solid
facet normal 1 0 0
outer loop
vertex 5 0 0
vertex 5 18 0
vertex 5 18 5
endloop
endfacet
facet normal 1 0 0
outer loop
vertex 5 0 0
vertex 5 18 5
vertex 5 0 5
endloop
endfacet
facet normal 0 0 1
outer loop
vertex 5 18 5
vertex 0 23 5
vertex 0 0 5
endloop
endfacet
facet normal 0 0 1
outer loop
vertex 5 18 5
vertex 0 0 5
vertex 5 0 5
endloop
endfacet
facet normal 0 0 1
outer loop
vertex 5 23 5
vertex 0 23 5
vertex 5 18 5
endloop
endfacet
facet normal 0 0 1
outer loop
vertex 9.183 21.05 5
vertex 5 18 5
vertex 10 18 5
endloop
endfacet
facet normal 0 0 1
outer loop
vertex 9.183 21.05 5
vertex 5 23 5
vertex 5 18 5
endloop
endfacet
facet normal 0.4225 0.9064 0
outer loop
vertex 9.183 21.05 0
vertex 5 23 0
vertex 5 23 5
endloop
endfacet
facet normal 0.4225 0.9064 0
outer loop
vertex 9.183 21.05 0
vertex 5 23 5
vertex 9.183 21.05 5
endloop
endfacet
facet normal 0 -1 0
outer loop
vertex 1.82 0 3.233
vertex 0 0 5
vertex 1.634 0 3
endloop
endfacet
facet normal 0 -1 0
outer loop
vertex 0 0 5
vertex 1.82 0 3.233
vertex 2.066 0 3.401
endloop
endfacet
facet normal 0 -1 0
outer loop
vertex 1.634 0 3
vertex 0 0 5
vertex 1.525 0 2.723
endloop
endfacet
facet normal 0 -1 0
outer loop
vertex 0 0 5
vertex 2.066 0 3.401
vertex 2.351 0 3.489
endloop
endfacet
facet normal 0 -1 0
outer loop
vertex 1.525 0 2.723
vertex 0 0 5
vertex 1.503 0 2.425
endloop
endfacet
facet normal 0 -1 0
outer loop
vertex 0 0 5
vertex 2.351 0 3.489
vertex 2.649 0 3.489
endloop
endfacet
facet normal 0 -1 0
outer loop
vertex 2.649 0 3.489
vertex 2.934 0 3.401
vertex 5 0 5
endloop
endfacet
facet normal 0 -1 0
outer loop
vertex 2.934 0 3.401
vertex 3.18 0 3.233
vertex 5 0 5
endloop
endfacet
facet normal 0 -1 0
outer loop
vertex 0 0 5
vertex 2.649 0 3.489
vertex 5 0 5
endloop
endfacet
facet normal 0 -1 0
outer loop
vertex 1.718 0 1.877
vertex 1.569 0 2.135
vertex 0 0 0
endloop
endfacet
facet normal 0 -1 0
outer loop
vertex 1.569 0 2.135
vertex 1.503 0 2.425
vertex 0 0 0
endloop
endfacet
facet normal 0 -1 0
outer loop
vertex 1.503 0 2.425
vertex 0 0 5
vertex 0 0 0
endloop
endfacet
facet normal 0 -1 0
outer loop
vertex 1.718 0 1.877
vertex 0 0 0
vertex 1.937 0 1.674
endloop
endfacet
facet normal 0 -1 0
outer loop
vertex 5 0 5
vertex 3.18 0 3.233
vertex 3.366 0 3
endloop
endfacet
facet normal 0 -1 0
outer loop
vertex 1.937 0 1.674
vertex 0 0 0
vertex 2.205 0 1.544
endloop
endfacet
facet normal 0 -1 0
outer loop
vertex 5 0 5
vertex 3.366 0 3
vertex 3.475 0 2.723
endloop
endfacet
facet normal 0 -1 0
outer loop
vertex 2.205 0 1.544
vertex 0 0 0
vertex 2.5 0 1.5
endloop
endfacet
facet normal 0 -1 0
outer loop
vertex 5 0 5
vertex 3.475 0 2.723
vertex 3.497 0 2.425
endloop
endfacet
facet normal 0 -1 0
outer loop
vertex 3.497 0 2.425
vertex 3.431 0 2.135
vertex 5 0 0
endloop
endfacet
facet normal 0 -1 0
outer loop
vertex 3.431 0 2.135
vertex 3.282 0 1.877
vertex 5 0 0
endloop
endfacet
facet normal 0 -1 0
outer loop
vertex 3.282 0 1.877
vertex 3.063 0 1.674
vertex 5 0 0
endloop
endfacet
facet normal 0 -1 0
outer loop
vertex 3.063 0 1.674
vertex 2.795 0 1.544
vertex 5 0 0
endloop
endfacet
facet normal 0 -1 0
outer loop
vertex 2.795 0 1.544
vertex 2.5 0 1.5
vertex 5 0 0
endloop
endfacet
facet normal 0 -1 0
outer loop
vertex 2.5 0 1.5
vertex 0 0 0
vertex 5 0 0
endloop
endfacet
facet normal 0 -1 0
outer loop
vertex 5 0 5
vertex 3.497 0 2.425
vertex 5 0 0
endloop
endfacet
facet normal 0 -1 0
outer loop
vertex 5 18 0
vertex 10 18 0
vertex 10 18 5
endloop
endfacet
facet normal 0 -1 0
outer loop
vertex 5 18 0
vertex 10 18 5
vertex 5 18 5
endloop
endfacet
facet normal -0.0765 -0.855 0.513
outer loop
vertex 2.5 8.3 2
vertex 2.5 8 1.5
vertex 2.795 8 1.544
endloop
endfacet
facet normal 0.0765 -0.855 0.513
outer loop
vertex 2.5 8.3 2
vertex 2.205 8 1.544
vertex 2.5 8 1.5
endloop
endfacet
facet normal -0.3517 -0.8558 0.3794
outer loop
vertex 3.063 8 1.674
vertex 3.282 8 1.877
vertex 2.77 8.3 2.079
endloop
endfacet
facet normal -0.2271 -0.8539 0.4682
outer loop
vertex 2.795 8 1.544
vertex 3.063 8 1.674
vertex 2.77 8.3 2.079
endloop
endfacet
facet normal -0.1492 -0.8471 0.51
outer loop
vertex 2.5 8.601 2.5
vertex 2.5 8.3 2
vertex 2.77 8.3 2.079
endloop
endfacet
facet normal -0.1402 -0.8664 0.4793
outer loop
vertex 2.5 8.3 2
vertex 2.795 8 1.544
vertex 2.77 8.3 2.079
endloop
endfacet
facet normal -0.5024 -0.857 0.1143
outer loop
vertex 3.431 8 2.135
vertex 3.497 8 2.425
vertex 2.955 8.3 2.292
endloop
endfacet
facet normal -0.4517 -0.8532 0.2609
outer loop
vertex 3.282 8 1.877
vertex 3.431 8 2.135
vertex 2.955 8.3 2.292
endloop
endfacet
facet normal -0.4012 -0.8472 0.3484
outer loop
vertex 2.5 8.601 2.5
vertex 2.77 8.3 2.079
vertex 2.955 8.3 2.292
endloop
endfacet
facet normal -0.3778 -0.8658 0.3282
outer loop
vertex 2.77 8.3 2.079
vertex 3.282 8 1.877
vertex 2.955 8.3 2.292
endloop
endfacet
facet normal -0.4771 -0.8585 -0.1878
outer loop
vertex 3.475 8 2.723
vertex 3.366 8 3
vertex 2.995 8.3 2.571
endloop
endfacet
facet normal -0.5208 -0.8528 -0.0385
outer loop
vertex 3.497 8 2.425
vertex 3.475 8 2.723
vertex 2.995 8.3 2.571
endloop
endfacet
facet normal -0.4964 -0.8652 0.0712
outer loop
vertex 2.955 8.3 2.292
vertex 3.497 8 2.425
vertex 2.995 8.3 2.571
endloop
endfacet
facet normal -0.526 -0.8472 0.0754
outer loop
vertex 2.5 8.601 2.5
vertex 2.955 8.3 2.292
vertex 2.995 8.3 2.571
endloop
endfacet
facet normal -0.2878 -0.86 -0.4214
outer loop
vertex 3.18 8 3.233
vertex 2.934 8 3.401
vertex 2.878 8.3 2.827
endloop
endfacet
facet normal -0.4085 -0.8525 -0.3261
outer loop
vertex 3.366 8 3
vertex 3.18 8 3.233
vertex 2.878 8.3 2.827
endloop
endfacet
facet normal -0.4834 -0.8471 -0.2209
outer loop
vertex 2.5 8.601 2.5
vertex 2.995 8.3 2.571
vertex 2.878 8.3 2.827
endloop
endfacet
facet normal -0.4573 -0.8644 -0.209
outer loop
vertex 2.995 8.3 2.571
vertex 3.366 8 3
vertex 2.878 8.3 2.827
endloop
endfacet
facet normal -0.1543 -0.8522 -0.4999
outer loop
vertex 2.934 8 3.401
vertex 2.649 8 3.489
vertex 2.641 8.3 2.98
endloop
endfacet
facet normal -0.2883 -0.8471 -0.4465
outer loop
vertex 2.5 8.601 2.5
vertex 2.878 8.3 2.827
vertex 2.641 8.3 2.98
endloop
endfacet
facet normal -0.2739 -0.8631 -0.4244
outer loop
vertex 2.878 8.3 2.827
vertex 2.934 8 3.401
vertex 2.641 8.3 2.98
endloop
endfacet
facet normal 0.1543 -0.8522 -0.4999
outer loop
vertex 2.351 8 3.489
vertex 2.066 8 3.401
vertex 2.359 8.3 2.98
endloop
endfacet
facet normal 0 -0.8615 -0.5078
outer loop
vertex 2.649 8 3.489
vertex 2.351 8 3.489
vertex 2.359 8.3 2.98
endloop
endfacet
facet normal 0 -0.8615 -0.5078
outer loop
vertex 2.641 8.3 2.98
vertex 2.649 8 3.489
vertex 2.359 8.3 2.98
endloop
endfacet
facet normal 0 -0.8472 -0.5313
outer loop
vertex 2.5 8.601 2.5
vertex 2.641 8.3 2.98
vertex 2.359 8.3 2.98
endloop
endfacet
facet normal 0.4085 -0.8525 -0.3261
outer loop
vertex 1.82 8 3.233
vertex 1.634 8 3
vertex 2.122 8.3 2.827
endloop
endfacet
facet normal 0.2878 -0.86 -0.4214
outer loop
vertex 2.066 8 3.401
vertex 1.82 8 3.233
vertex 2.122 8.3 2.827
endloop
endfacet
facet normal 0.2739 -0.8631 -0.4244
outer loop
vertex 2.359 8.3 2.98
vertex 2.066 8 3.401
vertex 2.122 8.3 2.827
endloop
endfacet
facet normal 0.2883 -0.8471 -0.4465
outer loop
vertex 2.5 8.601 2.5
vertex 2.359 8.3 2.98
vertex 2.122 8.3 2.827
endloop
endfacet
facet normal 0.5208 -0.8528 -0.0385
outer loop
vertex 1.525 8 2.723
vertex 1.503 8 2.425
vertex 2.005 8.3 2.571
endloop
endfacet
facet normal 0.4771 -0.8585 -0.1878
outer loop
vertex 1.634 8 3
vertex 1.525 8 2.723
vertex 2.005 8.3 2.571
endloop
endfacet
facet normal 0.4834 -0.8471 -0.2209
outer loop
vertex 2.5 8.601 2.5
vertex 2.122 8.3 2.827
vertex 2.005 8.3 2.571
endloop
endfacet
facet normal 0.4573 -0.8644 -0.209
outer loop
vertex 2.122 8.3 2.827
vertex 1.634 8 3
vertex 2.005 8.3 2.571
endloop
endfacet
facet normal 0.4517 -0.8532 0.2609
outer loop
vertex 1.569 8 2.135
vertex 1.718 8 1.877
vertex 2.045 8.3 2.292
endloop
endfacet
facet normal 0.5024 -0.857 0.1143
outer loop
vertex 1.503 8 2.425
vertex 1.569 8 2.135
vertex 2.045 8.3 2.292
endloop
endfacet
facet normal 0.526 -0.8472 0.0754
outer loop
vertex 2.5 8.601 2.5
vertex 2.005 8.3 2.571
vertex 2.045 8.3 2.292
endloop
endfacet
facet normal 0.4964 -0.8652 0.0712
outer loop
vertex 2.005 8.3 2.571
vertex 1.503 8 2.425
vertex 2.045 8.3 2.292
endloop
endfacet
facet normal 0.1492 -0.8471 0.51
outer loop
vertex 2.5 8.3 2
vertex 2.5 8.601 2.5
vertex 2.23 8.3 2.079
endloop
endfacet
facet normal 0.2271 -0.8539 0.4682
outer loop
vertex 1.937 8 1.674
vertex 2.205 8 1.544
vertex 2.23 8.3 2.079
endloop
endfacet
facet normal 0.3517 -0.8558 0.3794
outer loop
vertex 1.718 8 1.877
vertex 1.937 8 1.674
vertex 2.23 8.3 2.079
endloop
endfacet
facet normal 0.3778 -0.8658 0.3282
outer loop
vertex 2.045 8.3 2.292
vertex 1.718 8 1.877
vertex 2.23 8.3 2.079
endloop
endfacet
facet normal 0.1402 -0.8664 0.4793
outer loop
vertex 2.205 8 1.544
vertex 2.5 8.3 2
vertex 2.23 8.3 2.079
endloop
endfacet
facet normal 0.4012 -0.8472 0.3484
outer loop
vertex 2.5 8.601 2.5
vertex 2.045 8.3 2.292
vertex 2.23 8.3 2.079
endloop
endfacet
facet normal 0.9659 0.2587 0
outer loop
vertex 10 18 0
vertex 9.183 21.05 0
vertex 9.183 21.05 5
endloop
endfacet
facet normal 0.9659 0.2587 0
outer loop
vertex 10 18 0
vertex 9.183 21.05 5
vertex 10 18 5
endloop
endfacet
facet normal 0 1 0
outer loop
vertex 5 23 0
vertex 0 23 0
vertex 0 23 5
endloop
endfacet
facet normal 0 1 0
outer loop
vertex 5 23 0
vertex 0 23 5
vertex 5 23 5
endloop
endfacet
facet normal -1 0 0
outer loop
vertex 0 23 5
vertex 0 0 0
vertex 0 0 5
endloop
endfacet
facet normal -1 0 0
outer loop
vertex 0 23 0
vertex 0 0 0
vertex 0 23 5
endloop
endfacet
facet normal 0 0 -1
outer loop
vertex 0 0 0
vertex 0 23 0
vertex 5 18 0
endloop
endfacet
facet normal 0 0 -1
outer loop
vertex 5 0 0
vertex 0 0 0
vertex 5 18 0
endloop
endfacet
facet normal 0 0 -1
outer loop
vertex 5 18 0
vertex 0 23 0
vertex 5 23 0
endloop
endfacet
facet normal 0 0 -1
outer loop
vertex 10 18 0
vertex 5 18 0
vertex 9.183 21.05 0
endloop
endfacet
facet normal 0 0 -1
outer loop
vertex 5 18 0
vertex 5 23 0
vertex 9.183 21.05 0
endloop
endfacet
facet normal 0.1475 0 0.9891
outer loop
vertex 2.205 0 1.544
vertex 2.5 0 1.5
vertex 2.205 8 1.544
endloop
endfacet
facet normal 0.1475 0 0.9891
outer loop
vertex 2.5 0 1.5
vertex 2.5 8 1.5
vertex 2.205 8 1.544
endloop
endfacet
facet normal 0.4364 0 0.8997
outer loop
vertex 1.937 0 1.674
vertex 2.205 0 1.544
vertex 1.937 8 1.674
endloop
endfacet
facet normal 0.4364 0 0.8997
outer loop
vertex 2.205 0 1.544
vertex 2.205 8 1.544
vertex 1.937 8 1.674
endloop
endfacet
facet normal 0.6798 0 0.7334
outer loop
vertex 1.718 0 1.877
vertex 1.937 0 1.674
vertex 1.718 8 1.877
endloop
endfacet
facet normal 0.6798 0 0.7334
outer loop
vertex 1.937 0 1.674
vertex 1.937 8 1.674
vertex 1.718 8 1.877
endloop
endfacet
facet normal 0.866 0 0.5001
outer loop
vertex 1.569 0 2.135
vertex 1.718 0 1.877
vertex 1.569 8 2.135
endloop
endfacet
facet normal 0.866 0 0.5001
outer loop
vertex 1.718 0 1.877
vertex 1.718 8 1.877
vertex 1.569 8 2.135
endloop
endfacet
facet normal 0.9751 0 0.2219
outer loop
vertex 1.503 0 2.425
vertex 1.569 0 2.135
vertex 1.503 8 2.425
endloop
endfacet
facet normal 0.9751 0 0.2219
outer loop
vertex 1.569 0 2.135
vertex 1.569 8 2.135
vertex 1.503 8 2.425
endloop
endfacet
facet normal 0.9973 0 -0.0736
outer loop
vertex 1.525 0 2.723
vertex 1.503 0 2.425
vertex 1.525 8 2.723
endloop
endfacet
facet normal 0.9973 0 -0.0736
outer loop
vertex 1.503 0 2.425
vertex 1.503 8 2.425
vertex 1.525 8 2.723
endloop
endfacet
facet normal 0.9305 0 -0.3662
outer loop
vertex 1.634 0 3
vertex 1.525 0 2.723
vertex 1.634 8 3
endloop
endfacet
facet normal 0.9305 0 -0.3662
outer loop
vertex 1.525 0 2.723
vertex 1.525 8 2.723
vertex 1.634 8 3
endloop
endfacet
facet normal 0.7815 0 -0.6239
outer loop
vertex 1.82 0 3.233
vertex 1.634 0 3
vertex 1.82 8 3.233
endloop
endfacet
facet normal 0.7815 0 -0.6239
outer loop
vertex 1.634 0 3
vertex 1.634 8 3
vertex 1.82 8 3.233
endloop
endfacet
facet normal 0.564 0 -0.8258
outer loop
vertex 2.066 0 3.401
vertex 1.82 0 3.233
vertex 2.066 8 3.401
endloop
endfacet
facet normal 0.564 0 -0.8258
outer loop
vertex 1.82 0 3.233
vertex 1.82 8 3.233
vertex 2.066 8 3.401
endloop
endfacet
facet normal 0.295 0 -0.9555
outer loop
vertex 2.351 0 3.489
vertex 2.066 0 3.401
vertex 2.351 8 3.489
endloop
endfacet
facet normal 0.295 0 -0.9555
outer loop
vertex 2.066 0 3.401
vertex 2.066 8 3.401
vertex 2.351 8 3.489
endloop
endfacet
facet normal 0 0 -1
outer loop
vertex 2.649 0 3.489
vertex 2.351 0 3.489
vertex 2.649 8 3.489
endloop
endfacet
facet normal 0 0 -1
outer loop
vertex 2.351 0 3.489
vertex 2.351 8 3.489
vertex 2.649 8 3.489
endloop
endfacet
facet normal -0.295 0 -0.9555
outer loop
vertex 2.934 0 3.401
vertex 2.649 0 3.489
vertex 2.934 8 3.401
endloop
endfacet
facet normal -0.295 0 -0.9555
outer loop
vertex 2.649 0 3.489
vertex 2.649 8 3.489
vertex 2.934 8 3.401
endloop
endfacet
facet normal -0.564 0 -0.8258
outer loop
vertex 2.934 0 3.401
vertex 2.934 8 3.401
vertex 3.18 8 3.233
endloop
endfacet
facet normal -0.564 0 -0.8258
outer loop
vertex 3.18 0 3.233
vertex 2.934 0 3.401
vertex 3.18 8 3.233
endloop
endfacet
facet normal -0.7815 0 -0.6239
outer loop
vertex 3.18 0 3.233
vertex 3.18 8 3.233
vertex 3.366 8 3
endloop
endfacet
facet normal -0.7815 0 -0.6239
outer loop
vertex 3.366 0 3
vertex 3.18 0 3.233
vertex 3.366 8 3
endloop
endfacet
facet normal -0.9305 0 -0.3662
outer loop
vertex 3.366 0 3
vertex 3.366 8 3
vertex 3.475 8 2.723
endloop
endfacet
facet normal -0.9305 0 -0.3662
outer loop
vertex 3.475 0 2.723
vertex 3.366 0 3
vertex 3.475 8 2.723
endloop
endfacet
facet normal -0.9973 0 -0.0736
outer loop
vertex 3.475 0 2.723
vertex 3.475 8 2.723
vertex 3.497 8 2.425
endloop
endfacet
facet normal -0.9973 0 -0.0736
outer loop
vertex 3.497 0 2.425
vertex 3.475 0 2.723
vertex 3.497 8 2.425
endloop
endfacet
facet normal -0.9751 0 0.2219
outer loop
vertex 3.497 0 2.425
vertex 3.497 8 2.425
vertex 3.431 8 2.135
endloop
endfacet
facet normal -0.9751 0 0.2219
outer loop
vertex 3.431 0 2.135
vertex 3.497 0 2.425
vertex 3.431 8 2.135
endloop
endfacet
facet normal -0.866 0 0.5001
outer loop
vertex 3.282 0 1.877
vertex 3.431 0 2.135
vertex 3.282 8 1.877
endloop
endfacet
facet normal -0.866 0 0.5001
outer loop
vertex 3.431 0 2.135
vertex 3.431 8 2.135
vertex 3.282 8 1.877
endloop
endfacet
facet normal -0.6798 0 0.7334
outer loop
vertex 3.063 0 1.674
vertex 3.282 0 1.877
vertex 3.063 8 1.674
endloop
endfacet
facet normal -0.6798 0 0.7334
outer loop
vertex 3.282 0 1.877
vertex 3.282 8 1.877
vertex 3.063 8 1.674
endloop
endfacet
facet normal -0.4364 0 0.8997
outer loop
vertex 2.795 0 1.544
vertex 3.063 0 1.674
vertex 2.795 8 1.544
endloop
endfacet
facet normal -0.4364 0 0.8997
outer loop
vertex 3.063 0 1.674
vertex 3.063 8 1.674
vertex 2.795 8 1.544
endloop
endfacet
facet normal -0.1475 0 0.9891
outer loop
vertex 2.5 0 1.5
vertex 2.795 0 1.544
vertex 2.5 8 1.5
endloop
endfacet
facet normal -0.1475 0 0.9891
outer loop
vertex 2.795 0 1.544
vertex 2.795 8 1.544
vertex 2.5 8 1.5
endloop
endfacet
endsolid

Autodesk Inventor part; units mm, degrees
ref_plane "YZ Plane" through (0, 0, 0) normal (1, 0, 0) x (0, 1, 0)
ref_plane "XZ Plane" through (0, 0, 0) normal (0, 1, 0) x (-1, 0, 0)
ref_plane "XY Plane" through (0, 0, 0) normal (0, 0, 1) x (1, 0, 0)
sketch "Esquisse1" plane through (0, 0, 0) normal (0, 0, 1) x (1, 0, 0)
  line L0 (0, 0) -> (0, 23)
  line L1 (-2, 0) -> (12, 0) projected
  line L2 (0, -4.6) -> (0, 27.6) projected
  line L3 (0, 23) -> (5, 23)
  line L4 (5, 23) -> (9.1829, 21.0495)
  line L5 (9.1829, 21.0495) -> (10, 18)
  line L6 (10, 18) -> (5, 18)
  line L7 (5, 18) -> (5, 0)
  line L8 (0, 0) -> (5, 0)
  point P0 (0, 0)
  dimension "d8" = 5
  dimension "d9" = 5
  dimension "d10" = 75
  dimension "d12" = 130
  dimension "d13" = 18
  dimension "d14" = 5
  dimension "d24" = 5
extrude "Extrusion1" add sketch "Esquisse1" along normal blind 5
sketch "Esquisse3" plane through (0, 0, 0) normal (0, -1, 0) x (1, 0, 0)
  line L0 (0, 5) -> (5, 5) projected
  line L1 (0, 0) -> (0, 5) projected
  point P0 (2.5, 2.5)
  point P1 (2.5, 5)
  dimension "d15" = 2.5
  dimension "d16" = 2.5
hole "Perçage1" at (2.5, 0, 2.5) direction (0, 1, 0) diameter 2 depth 8 tip angle 118
properties part number "calle"
